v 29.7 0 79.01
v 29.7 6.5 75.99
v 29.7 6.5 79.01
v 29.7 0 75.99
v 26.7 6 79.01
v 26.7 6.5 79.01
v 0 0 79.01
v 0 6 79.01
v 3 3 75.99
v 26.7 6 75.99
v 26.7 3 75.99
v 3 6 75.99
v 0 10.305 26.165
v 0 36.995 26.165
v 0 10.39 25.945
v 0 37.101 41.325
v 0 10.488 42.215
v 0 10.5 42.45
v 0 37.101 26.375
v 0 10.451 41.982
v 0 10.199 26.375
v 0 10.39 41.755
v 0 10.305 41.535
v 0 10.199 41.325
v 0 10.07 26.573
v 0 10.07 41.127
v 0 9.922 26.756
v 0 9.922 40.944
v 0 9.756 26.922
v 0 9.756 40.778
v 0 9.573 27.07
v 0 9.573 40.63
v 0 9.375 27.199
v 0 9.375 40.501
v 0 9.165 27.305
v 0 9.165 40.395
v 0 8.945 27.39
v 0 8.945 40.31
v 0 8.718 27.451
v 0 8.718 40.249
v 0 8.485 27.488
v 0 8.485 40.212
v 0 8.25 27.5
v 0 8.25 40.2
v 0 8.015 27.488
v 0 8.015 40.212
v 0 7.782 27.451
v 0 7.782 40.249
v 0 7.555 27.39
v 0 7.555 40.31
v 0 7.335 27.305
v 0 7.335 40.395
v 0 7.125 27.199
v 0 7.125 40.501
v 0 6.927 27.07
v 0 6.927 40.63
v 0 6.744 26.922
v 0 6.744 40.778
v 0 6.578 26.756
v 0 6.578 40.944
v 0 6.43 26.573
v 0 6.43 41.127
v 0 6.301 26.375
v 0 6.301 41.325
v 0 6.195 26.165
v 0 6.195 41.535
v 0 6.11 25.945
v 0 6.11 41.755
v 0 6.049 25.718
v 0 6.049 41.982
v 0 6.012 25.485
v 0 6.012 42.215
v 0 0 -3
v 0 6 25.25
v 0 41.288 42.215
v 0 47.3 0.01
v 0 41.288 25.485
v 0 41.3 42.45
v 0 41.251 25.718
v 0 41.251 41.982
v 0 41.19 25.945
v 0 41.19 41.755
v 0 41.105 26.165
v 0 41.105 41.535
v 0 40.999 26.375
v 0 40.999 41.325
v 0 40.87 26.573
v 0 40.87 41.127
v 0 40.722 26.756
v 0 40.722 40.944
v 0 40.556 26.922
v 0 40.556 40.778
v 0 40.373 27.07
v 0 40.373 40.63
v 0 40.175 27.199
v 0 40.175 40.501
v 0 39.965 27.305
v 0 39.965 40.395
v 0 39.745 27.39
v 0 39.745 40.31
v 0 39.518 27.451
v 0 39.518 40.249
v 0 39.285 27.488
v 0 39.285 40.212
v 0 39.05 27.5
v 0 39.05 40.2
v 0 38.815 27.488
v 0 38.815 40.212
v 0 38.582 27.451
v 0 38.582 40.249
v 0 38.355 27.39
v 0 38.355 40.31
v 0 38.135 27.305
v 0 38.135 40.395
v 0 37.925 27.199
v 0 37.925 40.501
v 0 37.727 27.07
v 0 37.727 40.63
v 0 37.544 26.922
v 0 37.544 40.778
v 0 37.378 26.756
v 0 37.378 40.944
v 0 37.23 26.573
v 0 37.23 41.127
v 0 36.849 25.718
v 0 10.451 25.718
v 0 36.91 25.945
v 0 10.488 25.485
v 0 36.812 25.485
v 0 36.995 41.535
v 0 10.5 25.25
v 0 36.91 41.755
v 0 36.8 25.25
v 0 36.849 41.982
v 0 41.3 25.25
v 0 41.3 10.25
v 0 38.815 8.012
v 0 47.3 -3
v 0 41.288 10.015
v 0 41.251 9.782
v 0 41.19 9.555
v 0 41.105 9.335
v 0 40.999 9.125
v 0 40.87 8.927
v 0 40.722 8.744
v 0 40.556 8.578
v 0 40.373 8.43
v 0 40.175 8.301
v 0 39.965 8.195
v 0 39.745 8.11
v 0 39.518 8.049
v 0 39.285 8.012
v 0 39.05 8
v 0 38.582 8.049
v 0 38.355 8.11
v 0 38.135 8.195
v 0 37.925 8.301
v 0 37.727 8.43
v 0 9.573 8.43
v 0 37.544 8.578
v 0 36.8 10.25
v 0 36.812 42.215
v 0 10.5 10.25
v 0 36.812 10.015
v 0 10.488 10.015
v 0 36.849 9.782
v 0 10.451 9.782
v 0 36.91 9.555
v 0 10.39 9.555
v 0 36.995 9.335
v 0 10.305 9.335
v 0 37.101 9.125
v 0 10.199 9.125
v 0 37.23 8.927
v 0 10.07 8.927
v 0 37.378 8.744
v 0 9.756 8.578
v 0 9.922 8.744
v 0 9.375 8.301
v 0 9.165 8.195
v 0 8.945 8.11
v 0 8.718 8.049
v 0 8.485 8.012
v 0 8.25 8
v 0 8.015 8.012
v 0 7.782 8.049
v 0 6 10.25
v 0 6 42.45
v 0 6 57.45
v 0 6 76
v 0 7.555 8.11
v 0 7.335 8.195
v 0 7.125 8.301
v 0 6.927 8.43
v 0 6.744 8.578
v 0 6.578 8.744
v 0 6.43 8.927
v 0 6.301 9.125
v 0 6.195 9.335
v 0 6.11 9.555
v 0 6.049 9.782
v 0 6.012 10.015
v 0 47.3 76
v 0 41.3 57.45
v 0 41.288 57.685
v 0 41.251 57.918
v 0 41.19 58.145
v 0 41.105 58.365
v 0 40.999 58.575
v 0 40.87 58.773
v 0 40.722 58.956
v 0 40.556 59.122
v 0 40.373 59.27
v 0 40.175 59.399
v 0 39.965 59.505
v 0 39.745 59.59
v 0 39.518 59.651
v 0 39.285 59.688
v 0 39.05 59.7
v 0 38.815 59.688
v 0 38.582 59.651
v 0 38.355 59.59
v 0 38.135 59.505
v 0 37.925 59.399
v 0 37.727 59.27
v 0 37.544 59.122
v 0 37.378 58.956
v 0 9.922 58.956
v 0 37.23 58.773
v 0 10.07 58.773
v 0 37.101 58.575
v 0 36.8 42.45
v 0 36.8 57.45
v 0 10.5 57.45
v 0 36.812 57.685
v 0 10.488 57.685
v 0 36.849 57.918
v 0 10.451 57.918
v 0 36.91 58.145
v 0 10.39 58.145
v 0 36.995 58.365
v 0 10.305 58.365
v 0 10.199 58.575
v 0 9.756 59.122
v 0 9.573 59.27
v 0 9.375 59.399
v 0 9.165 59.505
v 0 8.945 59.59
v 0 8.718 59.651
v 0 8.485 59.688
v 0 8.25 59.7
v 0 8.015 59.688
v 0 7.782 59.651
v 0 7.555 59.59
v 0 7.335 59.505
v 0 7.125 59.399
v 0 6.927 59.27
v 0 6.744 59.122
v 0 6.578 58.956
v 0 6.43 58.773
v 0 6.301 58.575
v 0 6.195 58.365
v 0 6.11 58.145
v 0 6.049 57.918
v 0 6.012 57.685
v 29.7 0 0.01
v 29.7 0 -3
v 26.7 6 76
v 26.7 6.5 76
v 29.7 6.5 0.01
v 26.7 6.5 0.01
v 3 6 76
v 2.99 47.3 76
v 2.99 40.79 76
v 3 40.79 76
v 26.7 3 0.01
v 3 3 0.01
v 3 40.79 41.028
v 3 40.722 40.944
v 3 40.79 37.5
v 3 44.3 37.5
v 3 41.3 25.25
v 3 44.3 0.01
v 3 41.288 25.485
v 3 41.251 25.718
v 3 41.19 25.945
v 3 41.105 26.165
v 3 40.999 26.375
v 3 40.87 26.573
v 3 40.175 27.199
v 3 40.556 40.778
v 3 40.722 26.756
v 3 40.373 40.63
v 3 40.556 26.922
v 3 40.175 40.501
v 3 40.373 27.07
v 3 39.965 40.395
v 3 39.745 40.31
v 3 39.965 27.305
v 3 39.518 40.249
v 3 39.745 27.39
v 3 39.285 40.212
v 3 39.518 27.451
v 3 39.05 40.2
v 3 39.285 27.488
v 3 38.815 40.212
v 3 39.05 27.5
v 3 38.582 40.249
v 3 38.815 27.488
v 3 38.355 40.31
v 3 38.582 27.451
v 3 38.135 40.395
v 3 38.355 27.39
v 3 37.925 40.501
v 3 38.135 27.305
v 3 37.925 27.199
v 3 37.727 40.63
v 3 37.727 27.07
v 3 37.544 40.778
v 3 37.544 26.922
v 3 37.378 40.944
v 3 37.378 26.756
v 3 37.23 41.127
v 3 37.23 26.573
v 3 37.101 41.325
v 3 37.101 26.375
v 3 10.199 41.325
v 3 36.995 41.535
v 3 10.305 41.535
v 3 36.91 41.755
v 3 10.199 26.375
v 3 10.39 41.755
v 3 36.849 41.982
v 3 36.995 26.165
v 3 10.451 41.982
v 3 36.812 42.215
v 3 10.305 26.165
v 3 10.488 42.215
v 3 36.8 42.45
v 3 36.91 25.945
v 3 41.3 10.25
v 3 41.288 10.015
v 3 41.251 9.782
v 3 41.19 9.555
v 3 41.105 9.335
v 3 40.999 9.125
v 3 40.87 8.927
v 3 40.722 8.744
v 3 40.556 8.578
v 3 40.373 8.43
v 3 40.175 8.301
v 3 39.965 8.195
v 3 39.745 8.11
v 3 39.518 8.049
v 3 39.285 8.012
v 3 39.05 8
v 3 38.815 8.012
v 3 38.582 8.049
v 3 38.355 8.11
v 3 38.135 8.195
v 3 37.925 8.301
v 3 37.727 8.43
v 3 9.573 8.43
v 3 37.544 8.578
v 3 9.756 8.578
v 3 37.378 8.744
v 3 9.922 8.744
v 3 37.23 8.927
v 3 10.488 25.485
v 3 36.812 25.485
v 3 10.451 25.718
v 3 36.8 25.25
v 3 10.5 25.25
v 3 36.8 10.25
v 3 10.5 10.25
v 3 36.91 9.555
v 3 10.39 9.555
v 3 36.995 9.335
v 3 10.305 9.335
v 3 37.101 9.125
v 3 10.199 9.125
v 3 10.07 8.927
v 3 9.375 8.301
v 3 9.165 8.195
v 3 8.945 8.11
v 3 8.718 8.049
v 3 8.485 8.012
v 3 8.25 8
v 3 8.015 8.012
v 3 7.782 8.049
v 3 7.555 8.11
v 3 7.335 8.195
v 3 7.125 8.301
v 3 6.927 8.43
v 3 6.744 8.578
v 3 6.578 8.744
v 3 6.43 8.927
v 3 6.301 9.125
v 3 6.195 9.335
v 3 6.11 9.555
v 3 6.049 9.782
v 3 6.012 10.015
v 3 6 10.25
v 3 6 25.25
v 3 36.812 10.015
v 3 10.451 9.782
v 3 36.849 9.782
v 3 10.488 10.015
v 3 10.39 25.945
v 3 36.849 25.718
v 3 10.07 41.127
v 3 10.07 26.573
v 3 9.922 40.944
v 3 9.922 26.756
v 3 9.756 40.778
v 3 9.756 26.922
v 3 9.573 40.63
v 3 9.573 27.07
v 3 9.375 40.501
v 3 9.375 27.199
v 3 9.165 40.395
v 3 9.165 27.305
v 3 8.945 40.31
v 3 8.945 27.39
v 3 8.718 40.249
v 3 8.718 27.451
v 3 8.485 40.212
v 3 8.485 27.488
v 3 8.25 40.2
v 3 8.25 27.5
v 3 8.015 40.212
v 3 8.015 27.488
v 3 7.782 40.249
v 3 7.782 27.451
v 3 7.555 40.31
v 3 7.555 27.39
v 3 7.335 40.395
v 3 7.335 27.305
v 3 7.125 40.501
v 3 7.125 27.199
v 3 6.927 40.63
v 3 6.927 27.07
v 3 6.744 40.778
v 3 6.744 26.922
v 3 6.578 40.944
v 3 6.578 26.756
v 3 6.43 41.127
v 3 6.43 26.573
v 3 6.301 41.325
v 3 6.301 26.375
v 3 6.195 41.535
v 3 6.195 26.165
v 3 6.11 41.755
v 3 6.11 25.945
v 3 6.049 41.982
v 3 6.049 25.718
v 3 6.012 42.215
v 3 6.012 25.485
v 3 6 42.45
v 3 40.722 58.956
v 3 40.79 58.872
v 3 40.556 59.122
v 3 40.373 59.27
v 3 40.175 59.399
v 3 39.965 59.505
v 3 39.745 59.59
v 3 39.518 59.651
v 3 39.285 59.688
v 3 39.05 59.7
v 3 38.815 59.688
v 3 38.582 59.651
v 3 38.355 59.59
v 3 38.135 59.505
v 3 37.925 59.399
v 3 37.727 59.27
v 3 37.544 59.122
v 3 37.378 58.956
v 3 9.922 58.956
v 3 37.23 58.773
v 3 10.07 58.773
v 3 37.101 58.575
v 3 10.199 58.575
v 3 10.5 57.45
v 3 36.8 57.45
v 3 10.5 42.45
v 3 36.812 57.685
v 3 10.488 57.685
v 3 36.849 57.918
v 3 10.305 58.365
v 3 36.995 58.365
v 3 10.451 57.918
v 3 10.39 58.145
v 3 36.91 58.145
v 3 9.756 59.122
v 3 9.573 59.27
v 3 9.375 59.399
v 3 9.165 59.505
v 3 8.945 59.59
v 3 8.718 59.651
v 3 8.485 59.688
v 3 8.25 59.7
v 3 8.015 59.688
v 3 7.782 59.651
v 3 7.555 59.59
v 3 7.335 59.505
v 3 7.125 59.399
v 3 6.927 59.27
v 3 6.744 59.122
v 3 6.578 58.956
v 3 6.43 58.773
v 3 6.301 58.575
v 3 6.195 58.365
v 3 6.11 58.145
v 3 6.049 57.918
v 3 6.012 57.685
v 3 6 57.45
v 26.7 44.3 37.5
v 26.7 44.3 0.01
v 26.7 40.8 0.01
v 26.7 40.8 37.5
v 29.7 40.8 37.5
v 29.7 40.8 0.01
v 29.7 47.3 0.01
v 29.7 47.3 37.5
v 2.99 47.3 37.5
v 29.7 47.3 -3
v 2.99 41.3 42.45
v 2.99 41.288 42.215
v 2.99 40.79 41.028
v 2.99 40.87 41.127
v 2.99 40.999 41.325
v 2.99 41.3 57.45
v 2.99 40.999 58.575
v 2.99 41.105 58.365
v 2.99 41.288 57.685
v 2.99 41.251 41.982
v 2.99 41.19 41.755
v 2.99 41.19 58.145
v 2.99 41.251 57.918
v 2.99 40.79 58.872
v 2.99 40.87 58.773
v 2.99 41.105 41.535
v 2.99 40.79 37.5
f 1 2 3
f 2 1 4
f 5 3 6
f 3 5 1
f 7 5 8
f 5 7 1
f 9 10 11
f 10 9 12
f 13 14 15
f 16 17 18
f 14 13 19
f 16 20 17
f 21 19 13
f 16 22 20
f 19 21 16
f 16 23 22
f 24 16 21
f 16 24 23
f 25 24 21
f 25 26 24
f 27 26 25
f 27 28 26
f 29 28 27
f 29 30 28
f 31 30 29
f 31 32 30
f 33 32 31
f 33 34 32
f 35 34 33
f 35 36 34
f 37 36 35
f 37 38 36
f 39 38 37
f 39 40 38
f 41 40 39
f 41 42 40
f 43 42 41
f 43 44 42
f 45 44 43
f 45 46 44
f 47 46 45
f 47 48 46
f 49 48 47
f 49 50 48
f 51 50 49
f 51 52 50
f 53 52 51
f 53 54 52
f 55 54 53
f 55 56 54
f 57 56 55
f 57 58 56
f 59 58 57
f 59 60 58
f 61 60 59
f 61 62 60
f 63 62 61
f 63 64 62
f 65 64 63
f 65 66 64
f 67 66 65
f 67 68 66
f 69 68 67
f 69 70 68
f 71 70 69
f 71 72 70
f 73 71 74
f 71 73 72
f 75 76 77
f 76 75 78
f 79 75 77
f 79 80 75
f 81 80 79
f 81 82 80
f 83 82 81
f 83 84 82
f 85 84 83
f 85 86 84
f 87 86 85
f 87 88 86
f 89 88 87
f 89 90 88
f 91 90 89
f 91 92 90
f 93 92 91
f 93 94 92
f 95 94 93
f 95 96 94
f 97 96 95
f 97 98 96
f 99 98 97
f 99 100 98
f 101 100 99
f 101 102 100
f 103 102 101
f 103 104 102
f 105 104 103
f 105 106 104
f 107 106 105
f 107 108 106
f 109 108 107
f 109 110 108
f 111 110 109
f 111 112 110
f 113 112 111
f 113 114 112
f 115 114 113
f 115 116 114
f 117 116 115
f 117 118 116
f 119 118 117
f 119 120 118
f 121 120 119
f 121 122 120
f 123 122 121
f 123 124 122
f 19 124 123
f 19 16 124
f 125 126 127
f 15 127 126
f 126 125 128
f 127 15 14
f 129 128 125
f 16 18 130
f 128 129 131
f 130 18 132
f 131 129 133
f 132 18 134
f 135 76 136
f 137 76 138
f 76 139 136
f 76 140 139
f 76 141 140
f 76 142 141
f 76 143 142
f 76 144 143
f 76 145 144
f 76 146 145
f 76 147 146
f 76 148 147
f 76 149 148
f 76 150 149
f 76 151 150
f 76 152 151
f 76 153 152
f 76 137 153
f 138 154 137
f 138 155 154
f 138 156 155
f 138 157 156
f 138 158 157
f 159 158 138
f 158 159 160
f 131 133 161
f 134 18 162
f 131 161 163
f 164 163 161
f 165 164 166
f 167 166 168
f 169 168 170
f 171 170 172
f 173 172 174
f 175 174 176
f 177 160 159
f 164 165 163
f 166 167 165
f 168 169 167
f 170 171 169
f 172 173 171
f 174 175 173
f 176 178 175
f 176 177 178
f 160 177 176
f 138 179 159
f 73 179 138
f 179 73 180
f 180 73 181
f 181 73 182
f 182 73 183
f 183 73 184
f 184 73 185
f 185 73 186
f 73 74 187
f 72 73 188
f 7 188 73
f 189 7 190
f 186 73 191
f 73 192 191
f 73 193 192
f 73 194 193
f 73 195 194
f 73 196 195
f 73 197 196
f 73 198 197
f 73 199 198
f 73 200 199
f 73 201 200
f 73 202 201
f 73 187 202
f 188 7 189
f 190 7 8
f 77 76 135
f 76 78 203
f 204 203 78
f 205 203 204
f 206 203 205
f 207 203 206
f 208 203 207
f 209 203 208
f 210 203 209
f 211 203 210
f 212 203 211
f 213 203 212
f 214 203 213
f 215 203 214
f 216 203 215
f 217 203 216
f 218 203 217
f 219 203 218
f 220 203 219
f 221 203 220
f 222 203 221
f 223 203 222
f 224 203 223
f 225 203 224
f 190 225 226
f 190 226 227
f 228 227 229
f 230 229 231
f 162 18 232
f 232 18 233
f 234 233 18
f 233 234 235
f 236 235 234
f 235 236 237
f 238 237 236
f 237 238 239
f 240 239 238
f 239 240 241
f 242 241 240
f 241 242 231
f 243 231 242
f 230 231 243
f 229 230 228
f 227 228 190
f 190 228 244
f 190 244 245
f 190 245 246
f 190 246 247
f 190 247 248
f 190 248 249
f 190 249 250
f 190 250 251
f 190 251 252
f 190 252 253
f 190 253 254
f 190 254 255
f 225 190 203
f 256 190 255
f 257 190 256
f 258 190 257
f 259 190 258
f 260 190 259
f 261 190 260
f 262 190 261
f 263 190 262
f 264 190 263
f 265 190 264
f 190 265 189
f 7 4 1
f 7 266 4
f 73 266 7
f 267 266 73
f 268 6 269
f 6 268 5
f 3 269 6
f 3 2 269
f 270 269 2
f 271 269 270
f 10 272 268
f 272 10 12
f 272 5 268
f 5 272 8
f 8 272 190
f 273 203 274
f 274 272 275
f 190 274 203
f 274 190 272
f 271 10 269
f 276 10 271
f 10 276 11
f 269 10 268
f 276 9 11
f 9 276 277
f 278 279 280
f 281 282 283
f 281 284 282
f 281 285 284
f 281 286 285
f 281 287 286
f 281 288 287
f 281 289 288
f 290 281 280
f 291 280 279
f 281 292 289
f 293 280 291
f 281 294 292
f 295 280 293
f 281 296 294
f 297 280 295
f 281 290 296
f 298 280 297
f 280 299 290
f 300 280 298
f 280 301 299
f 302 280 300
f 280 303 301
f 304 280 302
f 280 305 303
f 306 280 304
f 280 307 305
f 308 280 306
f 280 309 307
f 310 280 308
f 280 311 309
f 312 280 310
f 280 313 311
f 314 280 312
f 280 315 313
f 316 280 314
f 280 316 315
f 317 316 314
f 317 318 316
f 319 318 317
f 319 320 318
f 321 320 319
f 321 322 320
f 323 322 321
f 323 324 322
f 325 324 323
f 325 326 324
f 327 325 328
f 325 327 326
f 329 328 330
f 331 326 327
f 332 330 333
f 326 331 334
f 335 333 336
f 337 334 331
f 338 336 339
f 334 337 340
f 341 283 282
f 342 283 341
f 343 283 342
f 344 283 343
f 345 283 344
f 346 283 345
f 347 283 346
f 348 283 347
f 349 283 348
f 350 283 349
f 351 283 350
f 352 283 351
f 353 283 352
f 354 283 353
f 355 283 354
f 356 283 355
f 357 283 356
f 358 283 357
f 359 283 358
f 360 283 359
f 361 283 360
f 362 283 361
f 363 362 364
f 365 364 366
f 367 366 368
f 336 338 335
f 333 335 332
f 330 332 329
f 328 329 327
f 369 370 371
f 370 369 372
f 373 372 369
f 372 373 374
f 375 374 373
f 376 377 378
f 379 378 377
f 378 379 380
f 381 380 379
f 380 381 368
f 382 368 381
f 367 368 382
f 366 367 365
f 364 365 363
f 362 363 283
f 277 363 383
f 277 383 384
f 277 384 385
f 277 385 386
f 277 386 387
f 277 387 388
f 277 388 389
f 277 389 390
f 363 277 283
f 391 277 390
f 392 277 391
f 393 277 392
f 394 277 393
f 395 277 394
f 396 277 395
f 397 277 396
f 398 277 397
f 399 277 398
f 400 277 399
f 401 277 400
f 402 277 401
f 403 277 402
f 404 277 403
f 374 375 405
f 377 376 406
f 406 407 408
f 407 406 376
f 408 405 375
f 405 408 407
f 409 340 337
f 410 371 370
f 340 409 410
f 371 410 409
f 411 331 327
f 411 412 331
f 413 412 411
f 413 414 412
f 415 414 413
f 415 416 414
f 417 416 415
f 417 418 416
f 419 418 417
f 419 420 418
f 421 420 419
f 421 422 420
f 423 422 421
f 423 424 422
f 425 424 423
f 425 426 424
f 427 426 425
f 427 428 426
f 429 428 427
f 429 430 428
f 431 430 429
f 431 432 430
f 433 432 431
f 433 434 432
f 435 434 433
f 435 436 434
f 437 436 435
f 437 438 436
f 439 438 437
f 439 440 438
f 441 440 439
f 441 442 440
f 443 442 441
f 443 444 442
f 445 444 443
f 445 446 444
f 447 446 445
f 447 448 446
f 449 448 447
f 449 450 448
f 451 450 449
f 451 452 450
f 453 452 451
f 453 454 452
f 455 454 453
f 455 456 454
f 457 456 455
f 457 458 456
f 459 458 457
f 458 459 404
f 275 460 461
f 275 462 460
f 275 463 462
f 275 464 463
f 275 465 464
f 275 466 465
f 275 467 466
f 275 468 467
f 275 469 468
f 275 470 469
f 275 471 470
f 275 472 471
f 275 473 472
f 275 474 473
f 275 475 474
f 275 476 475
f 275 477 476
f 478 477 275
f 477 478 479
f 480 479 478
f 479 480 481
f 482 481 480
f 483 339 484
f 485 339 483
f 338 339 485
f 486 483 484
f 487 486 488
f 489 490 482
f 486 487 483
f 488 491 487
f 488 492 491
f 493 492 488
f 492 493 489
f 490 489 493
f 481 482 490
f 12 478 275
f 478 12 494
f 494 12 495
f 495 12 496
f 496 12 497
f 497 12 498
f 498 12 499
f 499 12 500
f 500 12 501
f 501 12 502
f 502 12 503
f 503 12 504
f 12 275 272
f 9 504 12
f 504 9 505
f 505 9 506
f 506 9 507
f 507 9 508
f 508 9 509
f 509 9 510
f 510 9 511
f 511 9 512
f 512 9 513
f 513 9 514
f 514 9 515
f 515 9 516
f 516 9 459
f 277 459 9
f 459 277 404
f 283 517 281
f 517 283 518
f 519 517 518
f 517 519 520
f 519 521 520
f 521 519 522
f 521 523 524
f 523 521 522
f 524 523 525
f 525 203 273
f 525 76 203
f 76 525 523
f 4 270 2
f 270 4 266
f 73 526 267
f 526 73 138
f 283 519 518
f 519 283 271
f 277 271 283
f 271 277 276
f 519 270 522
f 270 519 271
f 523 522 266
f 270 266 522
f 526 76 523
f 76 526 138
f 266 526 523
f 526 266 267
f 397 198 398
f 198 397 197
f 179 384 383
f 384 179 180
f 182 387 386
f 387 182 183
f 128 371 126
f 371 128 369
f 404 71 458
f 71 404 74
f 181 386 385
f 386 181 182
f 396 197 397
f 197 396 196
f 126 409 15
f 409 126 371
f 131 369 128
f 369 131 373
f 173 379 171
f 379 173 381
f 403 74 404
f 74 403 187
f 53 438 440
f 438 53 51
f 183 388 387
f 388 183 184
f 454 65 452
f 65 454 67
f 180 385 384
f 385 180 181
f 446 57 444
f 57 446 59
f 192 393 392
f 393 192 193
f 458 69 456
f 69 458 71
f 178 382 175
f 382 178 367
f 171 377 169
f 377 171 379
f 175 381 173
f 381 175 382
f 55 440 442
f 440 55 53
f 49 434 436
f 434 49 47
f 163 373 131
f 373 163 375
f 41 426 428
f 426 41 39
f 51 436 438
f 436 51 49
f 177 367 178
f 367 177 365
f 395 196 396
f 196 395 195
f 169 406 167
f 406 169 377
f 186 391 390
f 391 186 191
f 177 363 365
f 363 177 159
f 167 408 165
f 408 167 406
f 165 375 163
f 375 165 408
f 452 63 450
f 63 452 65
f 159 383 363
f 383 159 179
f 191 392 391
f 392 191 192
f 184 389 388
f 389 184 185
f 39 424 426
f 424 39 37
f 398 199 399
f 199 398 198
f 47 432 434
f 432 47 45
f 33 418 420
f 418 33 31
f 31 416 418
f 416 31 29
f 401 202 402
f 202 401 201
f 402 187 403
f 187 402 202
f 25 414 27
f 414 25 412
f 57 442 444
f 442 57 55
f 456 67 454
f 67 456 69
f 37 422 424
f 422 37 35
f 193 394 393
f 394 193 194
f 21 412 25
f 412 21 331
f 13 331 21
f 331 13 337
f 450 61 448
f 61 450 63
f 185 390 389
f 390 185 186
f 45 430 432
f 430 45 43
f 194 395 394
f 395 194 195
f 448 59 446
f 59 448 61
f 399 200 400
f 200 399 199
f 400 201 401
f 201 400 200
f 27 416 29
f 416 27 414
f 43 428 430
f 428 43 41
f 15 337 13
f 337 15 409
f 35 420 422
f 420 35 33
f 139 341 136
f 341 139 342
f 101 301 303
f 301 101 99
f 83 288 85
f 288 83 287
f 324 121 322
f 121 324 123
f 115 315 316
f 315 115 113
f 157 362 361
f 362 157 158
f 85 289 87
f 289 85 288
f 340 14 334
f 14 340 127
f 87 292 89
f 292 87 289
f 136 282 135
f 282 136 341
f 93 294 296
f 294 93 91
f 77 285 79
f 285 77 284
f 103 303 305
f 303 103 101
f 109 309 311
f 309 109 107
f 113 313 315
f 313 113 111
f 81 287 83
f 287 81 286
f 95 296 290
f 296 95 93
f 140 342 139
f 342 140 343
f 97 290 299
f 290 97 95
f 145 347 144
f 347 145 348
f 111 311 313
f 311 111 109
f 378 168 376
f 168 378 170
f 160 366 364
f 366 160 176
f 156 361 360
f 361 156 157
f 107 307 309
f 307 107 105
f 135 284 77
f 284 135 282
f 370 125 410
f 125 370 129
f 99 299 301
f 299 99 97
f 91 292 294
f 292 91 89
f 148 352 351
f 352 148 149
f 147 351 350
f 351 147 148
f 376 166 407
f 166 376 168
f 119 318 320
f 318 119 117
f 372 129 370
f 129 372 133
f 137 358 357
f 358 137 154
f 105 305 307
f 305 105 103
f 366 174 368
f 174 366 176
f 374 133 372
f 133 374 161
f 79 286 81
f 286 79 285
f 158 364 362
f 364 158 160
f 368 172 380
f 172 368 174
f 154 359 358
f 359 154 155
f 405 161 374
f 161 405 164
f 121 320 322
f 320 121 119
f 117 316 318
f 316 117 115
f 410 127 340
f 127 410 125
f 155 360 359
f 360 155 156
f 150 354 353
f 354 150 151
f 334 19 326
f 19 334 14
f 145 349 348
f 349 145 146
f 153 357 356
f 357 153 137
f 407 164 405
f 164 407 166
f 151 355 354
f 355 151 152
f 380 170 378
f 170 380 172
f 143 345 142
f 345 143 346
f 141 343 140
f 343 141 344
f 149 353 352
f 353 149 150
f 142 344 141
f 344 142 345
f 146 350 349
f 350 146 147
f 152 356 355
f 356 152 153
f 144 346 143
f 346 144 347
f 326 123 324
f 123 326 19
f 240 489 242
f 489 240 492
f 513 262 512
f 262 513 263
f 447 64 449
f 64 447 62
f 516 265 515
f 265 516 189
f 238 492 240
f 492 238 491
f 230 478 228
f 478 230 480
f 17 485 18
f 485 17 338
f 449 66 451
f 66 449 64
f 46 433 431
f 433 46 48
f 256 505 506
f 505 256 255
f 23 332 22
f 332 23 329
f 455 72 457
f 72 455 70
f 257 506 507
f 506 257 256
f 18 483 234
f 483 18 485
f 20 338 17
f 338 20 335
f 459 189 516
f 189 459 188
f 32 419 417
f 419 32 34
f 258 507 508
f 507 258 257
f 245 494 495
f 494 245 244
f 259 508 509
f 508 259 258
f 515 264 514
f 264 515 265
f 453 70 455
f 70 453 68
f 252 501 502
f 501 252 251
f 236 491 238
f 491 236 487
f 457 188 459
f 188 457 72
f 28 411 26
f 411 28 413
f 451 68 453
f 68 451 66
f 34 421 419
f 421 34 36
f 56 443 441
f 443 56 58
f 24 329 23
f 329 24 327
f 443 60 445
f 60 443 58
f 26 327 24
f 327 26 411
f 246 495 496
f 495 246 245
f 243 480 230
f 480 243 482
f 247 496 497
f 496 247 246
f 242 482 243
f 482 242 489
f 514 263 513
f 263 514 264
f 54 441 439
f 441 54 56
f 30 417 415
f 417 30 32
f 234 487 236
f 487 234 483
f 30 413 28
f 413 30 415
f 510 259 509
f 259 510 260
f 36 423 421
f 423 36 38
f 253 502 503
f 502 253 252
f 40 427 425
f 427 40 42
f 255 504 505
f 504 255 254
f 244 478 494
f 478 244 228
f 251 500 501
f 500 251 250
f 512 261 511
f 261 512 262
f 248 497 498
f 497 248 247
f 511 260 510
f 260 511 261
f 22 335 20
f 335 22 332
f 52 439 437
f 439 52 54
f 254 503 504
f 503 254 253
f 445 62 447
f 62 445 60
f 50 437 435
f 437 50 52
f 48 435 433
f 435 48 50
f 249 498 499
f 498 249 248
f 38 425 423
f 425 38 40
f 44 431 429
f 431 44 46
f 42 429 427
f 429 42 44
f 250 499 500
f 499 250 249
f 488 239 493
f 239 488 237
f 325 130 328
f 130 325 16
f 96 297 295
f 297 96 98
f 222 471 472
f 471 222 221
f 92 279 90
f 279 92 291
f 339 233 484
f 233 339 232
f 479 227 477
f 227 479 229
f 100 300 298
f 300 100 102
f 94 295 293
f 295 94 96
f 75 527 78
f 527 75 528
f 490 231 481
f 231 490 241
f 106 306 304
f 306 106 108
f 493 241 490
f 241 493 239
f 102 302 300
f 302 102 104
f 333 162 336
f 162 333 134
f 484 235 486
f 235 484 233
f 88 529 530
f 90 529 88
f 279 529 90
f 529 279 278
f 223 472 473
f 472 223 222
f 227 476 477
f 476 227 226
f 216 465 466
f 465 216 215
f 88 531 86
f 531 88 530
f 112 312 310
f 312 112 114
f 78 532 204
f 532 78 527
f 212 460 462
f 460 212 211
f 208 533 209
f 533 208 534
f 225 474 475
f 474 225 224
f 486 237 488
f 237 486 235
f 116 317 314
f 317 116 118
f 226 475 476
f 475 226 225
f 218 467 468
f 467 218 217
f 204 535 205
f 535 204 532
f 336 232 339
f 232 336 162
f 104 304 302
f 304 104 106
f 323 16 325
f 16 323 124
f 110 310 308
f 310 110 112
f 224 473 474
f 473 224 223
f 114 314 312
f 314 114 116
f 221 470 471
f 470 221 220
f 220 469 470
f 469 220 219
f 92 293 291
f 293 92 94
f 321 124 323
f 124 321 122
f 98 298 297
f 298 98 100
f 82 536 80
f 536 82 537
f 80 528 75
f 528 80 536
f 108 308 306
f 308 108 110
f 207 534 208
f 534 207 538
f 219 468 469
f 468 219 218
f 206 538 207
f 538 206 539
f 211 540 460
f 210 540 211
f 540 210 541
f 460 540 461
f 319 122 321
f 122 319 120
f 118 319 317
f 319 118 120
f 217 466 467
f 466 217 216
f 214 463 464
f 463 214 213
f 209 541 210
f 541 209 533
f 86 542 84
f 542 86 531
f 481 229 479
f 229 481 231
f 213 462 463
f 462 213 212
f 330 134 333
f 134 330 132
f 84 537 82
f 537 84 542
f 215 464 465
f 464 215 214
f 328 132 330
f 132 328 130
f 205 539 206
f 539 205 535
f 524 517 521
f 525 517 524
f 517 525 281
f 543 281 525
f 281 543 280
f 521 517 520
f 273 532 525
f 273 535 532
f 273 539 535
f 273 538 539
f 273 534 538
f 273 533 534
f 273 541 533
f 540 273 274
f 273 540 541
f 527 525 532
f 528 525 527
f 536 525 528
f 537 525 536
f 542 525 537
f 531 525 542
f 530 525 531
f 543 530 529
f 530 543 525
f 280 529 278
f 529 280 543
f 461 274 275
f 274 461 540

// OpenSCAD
// ============================================================
// Vape Holder – OpenSCAD parametric model
// Based on: vape-mount.md (Draft v1)
// Measurements: Lost Mary disposable vape (measurments.md)
// Scope: vape-holding cradle only (no bar mount, tether, magnets)
//
// The holder is a single C-channel extrusion with integral lips,
// end walls, and strap slots – one continuous solid body.
// ============================================================

/* ── 1. Measured from the vape (Lost Mary) ─────────────────────
   Orientation (per measurments.md):
     vape upright, logo forward, mouthpiece at top-left.

   Mapping to spec variables:
     spec L  → vape Height ≈ 85 mm
     spec H  → vape Width  ≈ 40 mm
     spec T  → vape Depth  ≈ 21 mm
*/

L       = 85.3;     // total length incl. mouthpiece (largest Height)
L_body  = 75.0;     // ⚠ ESTIMATE – verify where mouthpiece starts
L_mouth = 10.3;     // ⚠ ESTIMATE – L minus L_body
H       = 40.3;     // body height (largest Width)
T       = 21.2;     // body thickness (largest Depth)
R       = 3.0;      // corner radius (approx, cosmetic only for now)

/* ── 2. Design variables ───────────────────────────────────── */

c        = 1.0;     // clearance per axis
p        = 1.5;     // pad thickness (closed-cell foam / rubber)
t_wall   = 3.0;     // minimum wall / plate thickness
O_bottom = 3.5;     // bottom lip overhang over vape front face
O_top    = 3.5;     // top lip overhang over vape front face
L_top_lip = L_body * 0.50;   // top lip covers this much from non-mouthpiece end
strap_w  = 18;      // strap width
strap_t  = 3.0;     // strap thickness
r_fillet = 2.0;     // target fillet radius (cosmetic, see note)
end_stop_h = 3.0;   // end-stop wall height at mouthpiece end

/* NOTE – fillets: the spec calls for 2 mm inside fillets.
   Because some walls are only 3 mm, automatic offset-based
   fillets in 2D would destroy thin features.  Add fillets in
   your slicer or a post-processing CAD tool.                  */

/* ── 3. Derived dimensions ─────────────────────────────────── */

plate_T = t_wall;                     // back plate thickness (alias)

cav_L = L_body + c;                   // cavity length  (Z axis)
cav_H = H + c;                        // cavity height  (Y axis)
// Cavity depth includes pad: spec §5.4 says depth is measured
// "from the pad surface" and must equal T + c.
cav_T = p + T + c;                    // cavity depth   (X axis)

outer_D = plate_T + cav_T + t_wall;   // total depth    (X)
outer_H = cav_H + 2 * t_wall;         // total height   (Y)

// Strap slot dimensions (spec §5.5: +1.5 mm tolerance)
slot_w = strap_w + 1.5;               // slot width  (along Z)
slot_h = strap_t + 1.5;               // slot height (along Y)

// Mouthpiece clearance zone length (spec §5.6)
mouth_clear = L_mouth + c + 2;

$fn = 60;

/* ── 4. C-channel cross-section ────────────────────────────── 
   Defined in the XY plane and extruded along Z.

   Coordinate convention:
     X = depth    0 = back face of plate  →  outer_D = front of lips
     Y = height   0 = bottom of holder    →  outer_H = top
     Z = length   extrusion axis (non-mouthpiece = 0)

   Cross-section looking from the mouthpiece end (+Z):

           ┌──┐   ← top curl (only present over L_top_lip)
           │  │
      ┌────┘  │
      │ back  │   ← open front (vape inserts here)
      │ plate │
      │       │
      └────┐  │
           │  │
           └──┘   ← bottom curl (full length)
*/

module c_profile() {
    polygon(points = [
        [0,              0                          ],  //  0 back-bottom
        [outer_D,        0                          ],  //  1 front-bottom
        [outer_D,        t_wall + O_bottom          ],  //  2 bottom curl top (outer)
        [outer_D-t_wall, t_wall + O_bottom          ],  //  3 bottom curl top (inner)
        [outer_D-t_wall, t_wall                     ],  //  4 cavity floor @ front wall
        [plate_T,        t_wall                     ],  //  5 cavity floor @ back plate
        [plate_T,        outer_H - t_wall           ],  //  6 cavity ceiling @ back plate
        [outer_D-t_wall, outer_H - t_wall           ],  //  7 cavity ceiling @ front wall
        [outer_D-t_wall, outer_H - t_wall - O_top   ],  //  8 top curl bottom (inner)
        [outer_D,        outer_H - t_wall - O_top   ],  //  9 top curl bottom (outer)
        [outer_D,        outer_H                    ],  // 10 front-top
        [0,              outer_H                    ],  // 11 back-top
    ]);
}

/* ── 5. Rounded strap slot ─────────────────────────────────── 
   Stadium-shaped hole through the back plate.
   y_ctr   = Y centre of the slot
   z_start = Z position of the slot's near edge
   The strap threads: behind plate → bottom slot → over
   vape front face → top slot → behind plate → buckle.
*/

module strap_slot(y_ctr, z_start) {
    hull() {
        translate([-0.1, y_ctr, z_start + slot_h/2])
            rotate([0, 90, 0])
                cylinder(d = slot_h, h = plate_T + 0.2);
        translate([-0.1, y_ctr, z_start + slot_w - slot_h/2])
            rotate([0, 90, 0])
                cylinder(d = slot_h, h = plate_T + 0.2);
    }
}

/* ── 6. Main body ──────────────────────────────────────────── */

module vape_holder() {

    // ─ Strap slot Y positions (centres) ─
    bot_slot_y = t_wall + 3 + slot_h/2;            // 3 mm above cavity floor
    top_slot_y = t_wall + cav_H - 3 - slot_h/2;    // 3 mm below cavity ceiling

    // ─ Strap Z positions (two straps along the length) ─
    strap1_z = 8;                                    // near non-mouthpiece end
    strap2_z = cav_L - mouth_clear - slot_w - 3;     // near mouthpiece, outside clearance

    difference() {
        union() {

            // ── C-channel body (full cavity length) ─────────
            // This single extrusion forms the back plate, both
            // lips with their curls, and the open-front cavity
            // – all as one connected solid.
            linear_extrude(height = cav_L)
                c_profile();

            // ── Non-mouthpiece end wall ─────────────────────
            // Solid rectangle closes this end of the cavity.
            translate([0, 0, -t_wall])
                linear_extrude(height = t_wall + 0.01)
                    square([outer_D, outer_H]);

            // ── Mouthpiece end wall (low, clears mouthpiece) 
            // Only rises end_stop_h above the shelf so the
            // mouthpiece can pass freely above it.
            translate([0, 0, cav_L - 0.01]) {
                // floor continuation
                cube([outer_D, t_wall, t_wall + 0.02]);
                // bottom curl continuation
                translate([outer_D - t_wall, 0, 0])
                    cube([t_wall, t_wall + O_bottom, t_wall + 0.02]);
                // back plate (low)
                cube([plate_T, t_wall + end_stop_h, t_wall + 0.02]);
                // end stop across cavity
                translate([plate_T, t_wall, 0])
                    cube([cav_T, end_stop_h, t_wall + 0.02]);
            }
        }

        // ── Remove top lip beyond L_top_lip ─────────────────
        // Mouthpiece region: no ceiling, no top curl, so the
        // vape can be tilted in/out and the mouthpiece is clear.
        translate([plate_T - 0.01,
                   outer_H - t_wall - O_top - 0.01,
                   L_top_lip])
            cube([cav_T + t_wall + 0.02,
                  t_wall + O_top + 0.02,
                  cav_L - L_top_lip + t_wall + 0.02]);

        // ── Strap slots (2 per strap × 2 straps = 4 total) ─
        // Each strap needs a bottom slot and a top slot through
        // the back plate so it can loop behind the plate and
        // wrap over the vape's front face.
        for (sz = [strap1_z, strap2_z]) {
            strap_slot(bot_slot_y, sz);
            strap_slot(top_slot_y, sz);
        }
    }
}

/* ── 7. Render ─────────────────────────────────────────────── */

vape_holder();

/* ── 8. Ghost vape for fit-check ─────────────────────────────
   Uncomment the two lines below to show a translucent box
   representing the vape body sitting in the cavity.           */

%color("SteelBlue", 0.25)
    translate([plate_T + p, t_wall, 0])
    cube([T, H, L_body]);
